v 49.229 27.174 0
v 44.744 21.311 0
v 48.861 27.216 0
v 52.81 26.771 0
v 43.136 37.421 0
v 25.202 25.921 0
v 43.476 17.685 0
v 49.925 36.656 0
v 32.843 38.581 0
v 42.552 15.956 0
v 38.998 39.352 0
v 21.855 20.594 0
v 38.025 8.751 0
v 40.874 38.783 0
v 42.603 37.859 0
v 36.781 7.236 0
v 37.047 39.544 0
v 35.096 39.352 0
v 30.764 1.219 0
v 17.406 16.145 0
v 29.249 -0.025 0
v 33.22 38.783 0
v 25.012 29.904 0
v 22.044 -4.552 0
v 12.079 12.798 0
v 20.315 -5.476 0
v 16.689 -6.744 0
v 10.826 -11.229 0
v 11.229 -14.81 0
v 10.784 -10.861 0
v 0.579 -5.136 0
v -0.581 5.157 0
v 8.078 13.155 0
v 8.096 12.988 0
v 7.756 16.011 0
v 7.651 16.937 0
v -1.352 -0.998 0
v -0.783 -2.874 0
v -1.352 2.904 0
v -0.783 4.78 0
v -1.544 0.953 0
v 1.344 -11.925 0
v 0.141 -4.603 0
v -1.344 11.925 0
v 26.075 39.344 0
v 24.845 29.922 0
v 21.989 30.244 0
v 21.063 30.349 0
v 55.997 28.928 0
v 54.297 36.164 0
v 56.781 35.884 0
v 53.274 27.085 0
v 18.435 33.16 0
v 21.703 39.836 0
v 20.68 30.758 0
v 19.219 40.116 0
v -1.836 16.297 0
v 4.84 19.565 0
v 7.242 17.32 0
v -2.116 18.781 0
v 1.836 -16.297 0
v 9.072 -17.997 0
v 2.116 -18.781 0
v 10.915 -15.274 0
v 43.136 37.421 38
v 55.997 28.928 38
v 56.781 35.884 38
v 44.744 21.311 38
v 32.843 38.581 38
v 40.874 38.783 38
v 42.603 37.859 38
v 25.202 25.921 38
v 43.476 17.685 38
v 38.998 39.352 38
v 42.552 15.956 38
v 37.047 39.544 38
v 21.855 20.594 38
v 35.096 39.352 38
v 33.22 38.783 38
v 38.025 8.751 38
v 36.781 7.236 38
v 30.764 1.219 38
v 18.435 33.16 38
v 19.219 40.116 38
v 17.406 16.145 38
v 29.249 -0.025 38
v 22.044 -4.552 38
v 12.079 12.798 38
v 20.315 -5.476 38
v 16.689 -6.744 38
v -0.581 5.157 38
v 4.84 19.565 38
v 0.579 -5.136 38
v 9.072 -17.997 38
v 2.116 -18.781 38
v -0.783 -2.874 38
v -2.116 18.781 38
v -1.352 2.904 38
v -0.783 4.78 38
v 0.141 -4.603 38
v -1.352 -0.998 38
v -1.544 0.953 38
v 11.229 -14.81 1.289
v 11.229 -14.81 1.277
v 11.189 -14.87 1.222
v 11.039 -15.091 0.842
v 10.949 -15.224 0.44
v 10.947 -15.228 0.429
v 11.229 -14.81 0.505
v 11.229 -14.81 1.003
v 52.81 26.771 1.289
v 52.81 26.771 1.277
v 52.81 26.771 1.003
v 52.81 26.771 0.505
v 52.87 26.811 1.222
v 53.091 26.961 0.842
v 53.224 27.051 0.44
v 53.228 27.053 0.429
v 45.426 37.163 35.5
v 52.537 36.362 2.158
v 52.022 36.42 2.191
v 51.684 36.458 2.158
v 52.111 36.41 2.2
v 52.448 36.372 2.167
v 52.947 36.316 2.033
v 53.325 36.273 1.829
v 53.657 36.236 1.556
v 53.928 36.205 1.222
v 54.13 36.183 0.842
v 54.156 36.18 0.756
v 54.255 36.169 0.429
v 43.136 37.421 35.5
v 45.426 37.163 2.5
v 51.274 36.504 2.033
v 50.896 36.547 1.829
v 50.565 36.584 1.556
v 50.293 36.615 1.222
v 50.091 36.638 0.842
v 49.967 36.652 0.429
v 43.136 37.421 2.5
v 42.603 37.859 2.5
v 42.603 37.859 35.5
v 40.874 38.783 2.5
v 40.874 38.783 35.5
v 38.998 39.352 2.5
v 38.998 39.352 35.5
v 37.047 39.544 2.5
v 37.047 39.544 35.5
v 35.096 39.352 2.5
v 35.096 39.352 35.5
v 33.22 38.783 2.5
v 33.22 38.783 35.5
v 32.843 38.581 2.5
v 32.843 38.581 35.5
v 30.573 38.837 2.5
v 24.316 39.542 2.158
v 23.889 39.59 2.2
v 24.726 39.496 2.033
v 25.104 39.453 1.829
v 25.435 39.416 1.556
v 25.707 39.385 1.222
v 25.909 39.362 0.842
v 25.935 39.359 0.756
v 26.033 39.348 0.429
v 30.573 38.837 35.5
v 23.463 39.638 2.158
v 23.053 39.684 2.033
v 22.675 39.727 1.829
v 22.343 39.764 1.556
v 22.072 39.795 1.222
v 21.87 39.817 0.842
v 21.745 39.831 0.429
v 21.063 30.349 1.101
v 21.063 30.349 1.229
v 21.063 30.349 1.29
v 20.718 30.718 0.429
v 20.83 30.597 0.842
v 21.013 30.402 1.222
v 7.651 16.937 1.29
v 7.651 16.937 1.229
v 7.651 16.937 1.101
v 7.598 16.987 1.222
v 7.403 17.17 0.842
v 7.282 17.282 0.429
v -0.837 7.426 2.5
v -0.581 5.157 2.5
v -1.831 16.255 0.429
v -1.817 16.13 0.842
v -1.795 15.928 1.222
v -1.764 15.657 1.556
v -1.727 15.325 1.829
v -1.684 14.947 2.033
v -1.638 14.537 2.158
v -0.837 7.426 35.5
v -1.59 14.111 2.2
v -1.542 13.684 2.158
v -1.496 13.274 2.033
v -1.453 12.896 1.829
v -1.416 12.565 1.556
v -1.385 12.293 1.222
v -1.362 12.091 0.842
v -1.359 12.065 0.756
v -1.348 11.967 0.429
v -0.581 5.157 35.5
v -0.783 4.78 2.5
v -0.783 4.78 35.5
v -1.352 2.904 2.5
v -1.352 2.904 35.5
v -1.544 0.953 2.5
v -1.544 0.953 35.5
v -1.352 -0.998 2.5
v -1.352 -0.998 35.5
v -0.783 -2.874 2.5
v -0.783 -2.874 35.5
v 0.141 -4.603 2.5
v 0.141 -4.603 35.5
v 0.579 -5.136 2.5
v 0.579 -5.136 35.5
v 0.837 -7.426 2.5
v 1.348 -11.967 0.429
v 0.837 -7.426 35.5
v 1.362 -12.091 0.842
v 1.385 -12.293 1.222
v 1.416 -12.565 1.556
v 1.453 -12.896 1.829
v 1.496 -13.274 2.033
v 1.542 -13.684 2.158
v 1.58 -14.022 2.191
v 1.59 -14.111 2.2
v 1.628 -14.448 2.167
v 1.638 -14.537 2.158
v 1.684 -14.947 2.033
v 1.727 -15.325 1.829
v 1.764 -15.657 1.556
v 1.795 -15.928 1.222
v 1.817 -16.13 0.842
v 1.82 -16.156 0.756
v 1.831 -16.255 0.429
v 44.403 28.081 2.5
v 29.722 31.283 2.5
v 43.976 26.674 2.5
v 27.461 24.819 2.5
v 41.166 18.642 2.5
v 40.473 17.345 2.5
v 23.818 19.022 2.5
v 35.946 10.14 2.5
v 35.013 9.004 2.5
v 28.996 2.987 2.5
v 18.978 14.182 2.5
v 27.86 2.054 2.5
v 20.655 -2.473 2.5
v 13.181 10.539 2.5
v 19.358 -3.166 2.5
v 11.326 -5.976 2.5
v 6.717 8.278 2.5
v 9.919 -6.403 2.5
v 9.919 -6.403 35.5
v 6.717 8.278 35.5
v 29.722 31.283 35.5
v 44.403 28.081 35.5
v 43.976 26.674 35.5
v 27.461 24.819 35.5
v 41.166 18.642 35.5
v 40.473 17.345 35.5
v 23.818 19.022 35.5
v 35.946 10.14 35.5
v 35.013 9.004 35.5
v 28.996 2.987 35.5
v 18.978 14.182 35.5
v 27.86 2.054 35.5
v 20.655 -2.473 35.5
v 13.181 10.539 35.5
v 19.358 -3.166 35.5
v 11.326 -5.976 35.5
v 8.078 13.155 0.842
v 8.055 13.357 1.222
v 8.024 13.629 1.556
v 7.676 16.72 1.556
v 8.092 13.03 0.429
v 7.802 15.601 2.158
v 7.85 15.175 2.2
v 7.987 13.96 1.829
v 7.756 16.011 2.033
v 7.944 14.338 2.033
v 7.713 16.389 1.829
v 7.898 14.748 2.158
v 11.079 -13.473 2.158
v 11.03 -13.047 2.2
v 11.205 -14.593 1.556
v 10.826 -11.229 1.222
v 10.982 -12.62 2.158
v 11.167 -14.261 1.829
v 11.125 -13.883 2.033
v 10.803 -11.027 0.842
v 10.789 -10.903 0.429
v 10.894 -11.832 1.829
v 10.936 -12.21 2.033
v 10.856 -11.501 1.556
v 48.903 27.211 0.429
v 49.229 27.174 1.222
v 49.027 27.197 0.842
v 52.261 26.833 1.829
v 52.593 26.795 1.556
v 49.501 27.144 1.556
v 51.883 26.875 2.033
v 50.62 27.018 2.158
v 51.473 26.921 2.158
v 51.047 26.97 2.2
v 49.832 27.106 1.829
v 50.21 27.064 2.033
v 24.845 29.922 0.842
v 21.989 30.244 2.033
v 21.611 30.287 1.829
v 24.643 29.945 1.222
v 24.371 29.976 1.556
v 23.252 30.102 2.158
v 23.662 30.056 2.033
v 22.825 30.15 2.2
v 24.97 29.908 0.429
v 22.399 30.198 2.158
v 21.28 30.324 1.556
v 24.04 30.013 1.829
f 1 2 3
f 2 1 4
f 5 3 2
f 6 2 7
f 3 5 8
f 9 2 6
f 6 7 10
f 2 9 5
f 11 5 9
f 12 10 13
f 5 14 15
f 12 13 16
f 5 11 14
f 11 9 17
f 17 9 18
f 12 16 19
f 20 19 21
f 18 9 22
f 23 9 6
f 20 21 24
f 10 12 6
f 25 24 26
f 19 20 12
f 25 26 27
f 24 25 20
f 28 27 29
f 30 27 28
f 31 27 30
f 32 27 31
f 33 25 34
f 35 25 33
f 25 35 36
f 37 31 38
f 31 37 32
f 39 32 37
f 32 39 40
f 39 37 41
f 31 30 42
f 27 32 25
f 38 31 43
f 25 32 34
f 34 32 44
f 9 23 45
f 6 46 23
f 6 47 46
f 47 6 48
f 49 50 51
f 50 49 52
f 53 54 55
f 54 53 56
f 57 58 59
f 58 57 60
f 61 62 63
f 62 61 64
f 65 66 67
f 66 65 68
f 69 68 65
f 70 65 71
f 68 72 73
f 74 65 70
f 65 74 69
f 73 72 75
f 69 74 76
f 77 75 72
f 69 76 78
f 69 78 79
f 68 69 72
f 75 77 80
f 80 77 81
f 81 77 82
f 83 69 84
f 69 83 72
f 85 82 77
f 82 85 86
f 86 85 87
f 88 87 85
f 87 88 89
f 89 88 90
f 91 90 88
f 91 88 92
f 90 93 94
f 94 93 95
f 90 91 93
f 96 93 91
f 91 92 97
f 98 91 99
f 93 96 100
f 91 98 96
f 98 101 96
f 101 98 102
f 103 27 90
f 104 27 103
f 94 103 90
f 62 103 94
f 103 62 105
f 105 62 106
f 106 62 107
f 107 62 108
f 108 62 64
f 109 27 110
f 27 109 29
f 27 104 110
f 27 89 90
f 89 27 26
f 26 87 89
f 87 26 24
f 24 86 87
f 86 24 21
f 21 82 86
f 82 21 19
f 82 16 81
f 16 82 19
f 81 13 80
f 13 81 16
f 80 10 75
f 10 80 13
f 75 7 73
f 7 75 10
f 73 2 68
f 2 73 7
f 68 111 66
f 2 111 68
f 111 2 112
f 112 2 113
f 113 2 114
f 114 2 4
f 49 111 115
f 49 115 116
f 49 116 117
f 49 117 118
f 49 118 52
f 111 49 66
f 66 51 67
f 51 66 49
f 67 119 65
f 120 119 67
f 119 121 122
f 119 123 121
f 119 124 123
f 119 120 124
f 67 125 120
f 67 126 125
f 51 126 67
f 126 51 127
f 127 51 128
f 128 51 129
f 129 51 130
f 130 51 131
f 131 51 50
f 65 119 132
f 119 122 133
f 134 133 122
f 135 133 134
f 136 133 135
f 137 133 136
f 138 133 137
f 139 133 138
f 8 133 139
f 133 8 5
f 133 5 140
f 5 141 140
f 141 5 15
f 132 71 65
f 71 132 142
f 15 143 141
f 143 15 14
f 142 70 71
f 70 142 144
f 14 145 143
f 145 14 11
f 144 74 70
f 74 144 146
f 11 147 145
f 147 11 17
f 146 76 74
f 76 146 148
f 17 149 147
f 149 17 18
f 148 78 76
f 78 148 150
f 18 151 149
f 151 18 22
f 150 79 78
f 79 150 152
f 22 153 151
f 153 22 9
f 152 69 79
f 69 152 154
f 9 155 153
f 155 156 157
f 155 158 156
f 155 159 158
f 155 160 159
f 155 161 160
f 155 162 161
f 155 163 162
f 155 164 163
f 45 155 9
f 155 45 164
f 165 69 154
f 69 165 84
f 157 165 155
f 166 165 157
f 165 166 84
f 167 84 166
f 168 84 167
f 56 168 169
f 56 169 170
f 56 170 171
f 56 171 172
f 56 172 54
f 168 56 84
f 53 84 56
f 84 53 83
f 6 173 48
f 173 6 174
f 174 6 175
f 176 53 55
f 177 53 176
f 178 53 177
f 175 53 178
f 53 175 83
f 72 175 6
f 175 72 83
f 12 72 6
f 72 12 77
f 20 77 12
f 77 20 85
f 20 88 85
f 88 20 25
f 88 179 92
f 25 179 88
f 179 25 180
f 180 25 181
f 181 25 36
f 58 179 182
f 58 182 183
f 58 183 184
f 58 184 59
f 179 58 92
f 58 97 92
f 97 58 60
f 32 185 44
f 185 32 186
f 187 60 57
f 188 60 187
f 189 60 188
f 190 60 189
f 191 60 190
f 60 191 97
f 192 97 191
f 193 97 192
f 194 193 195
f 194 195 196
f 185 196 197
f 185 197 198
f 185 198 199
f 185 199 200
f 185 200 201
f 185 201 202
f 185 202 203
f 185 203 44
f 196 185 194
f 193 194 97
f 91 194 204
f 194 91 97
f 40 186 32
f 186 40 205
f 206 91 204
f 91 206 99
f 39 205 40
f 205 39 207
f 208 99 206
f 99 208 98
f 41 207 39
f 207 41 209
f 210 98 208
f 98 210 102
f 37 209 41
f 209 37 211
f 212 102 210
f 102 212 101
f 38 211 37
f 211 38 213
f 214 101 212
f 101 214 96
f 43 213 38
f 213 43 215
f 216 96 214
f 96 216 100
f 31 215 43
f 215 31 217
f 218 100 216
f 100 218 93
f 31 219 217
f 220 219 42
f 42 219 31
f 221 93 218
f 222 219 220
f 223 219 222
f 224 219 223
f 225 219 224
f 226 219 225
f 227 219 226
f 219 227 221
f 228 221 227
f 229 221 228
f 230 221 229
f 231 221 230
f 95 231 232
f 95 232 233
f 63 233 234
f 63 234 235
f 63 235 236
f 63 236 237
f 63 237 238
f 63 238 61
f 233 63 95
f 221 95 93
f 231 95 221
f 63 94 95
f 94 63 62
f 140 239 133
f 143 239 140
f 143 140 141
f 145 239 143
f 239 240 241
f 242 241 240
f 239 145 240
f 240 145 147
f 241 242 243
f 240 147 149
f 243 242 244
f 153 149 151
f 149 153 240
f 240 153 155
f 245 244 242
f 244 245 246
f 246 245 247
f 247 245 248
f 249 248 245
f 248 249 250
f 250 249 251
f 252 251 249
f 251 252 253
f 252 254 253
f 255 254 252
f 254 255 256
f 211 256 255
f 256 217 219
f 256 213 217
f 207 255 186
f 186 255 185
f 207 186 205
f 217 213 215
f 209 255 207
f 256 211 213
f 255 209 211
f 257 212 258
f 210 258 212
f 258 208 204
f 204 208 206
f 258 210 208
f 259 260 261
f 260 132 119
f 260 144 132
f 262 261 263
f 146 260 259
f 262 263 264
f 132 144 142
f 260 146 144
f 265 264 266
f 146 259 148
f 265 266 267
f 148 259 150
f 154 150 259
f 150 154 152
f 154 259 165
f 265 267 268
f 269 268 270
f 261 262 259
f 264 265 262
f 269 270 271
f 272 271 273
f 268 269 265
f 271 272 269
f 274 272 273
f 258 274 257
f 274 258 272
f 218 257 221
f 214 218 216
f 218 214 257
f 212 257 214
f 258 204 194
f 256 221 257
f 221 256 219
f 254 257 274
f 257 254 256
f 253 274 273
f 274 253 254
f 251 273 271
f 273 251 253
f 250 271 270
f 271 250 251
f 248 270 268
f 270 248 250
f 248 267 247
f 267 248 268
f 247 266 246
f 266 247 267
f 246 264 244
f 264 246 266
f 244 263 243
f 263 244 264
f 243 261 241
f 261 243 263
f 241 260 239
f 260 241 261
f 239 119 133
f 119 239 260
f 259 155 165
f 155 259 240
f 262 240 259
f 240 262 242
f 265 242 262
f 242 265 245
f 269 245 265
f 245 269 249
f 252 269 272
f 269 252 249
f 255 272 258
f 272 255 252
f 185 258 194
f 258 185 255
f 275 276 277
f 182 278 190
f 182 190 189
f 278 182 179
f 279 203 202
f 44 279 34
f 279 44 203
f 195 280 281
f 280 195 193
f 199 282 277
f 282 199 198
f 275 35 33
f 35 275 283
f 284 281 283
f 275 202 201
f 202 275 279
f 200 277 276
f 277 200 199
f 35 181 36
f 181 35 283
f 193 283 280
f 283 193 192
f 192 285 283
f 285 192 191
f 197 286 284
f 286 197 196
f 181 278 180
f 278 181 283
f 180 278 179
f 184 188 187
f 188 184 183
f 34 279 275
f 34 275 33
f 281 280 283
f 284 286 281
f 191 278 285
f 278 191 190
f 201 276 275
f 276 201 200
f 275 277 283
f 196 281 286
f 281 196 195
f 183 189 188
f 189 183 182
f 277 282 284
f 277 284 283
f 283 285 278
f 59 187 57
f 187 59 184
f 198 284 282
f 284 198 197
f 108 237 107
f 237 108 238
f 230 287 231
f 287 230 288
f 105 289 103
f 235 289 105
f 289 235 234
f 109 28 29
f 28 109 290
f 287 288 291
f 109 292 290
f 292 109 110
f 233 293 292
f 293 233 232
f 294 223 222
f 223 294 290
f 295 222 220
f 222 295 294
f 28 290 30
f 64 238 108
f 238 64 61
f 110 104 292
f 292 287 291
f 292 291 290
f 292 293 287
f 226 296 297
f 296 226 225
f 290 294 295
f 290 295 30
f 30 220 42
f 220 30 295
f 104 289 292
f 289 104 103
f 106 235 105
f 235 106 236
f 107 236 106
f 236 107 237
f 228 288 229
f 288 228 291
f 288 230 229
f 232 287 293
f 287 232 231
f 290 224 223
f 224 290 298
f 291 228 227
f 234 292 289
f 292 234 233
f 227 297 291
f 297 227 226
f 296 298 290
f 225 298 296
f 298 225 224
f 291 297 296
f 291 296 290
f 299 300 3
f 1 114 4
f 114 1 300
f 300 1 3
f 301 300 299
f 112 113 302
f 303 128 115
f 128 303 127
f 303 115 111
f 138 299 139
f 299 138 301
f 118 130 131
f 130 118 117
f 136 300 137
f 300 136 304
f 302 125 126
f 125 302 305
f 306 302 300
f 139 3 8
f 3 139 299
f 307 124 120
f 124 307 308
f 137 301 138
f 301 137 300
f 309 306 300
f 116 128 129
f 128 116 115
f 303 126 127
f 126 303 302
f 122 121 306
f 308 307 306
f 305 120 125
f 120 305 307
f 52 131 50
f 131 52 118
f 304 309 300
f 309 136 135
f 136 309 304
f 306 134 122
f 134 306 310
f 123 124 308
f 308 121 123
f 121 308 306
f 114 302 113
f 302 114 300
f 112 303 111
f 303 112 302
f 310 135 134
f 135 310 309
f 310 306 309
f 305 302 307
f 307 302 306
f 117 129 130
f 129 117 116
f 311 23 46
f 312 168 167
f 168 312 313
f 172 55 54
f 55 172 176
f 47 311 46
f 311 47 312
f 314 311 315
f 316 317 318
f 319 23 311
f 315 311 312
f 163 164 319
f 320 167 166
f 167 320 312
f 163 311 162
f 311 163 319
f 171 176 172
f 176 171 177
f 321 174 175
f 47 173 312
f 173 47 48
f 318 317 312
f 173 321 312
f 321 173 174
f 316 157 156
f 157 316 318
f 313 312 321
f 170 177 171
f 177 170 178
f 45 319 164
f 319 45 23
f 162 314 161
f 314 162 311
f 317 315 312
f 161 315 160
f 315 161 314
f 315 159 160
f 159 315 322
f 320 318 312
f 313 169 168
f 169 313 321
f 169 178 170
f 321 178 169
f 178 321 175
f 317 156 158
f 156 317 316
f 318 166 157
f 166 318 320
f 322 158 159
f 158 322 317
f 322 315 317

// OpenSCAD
$fn = 32;

// ----------------------------------------------------------------------
// Air duct: 20 mm duct, 2.5 mm wall, 38 mm across
// ----------------------------------------------------------------------

// --- parameters (mm) ---
duct_r = 10;              // duct core radius
duct_d = 20;              // duct core diameter
wall = 2.5;               // duct wall thickness
height = 38;              // duct width (extrusion height)
port_r = 18.9;            // port flange half width
port_d = 37.8;            // port flange width
port_t = 7;               // port flange thickness
bolt_d = 4.4;             // port bolt holes
bolt_offset = 14.2;       // bolt hole offset from the port axis

difference() {
  /* outer hull chain: tube with a flat flange plate at every port */
  linear_extrude(height = 38) {
    hull() {
      polygon([[2.116, -18.781], [-2.116, 18.781], [4.84, 19.565], [9.072, -17.997]]);
      translate([9.937, 1.12]) circle(r = 10);
    }
    hull() {
      translate([9.937, 1.12]) circle(r = 10);
      translate([8.456, 0.953]) circle(r = 10);
    }
    hull() {
      translate([8.456, 0.953]) circle(r = 10);
      translate([16.488, 3.763]) circle(r = 10);
    }
    hull() {
      translate([16.488, 3.763]) circle(r = 10);
      translate([23.693, 8.29]) circle(r = 10);
    }
    hull() {
      translate([23.693, 8.29]) circle(r = 10);
      translate([29.71, 14.307]) circle(r = 10);
    }
    hull() {
      translate([29.71, 14.307]) circle(r = 10);
      translate([34.237, 21.512]) circle(r = 10);
    }
    hull() {
      translate([34.237, 21.512]) circle(r = 10);
      translate([37.047, 29.544]) circle(r = 10);
    }
    hull() {
      translate([37.047, 29.544]) circle(r = 10);
      translate([36.88, 28.063]) circle(r = 10);
    }
    hull() {
      translate([36.88, 28.063]) circle(r = 10);
      polygon([[19.219, 40.116], [56.781, 35.884], [55.997, 28.928], [18.435, 33.16]]);
    }
  }
  /* air passage: the same chain inset by the wall, 5 mm proud of the ports */
  translate([0, 0, 2.5]) linear_extrude(height = 33) {
    hull() {
      translate([-4.969, -0.56]) circle(r = 7.5);
      translate([8.456, 0.953]) circle(r = 7.5);
    }
    hull() {
      translate([8.456, 0.953]) circle(r = 7.5);
      translate([16.488, 3.763]) circle(r = 7.5);
    }
    hull() {
      translate([16.488, 3.763]) circle(r = 7.5);
      translate([23.693, 8.29]) circle(r = 7.5);
    }
    hull() {
      translate([23.693, 8.29]) circle(r = 7.5);
      translate([29.71, 14.307]) circle(r = 7.5);
    }
    hull() {
      translate([29.71, 14.307]) circle(r = 7.5);
      translate([34.237, 21.512]) circle(r = 7.5);
    }
    hull() {
      translate([34.237, 21.512]) circle(r = 7.5);
      translate([37.047, 29.544]) circle(r = 7.5);
    }
    hull() {
      translate([37.047, 29.544]) circle(r = 7.5);
      translate([38.56, 42.969]) circle(r = 7.5);
    }
  }
  translate([0, 0]) rotate([0, 0, -83.57]) translate([-14.2, -2.5]) rotate([-90, 0, 0]) cylinder(h = 12, d = 4.4);
  translate([0, 0]) rotate([0, 0, -83.57]) translate([14.2, -2.5]) rotate([-90, 0, 0]) cylinder(h = 12, d = 4.4);
  translate([38, 38]) rotate([0, 0, 173.57]) translate([-14.2, -2.5]) rotate([-90, 0, 0]) cylinder(h = 12, d = 4.4);
  translate([38, 38]) rotate([0, 0, 173.57]) translate([14.2, -2.5]) rotate([-90, 0, 0]) cylinder(h = 12, d = 4.4);
}
